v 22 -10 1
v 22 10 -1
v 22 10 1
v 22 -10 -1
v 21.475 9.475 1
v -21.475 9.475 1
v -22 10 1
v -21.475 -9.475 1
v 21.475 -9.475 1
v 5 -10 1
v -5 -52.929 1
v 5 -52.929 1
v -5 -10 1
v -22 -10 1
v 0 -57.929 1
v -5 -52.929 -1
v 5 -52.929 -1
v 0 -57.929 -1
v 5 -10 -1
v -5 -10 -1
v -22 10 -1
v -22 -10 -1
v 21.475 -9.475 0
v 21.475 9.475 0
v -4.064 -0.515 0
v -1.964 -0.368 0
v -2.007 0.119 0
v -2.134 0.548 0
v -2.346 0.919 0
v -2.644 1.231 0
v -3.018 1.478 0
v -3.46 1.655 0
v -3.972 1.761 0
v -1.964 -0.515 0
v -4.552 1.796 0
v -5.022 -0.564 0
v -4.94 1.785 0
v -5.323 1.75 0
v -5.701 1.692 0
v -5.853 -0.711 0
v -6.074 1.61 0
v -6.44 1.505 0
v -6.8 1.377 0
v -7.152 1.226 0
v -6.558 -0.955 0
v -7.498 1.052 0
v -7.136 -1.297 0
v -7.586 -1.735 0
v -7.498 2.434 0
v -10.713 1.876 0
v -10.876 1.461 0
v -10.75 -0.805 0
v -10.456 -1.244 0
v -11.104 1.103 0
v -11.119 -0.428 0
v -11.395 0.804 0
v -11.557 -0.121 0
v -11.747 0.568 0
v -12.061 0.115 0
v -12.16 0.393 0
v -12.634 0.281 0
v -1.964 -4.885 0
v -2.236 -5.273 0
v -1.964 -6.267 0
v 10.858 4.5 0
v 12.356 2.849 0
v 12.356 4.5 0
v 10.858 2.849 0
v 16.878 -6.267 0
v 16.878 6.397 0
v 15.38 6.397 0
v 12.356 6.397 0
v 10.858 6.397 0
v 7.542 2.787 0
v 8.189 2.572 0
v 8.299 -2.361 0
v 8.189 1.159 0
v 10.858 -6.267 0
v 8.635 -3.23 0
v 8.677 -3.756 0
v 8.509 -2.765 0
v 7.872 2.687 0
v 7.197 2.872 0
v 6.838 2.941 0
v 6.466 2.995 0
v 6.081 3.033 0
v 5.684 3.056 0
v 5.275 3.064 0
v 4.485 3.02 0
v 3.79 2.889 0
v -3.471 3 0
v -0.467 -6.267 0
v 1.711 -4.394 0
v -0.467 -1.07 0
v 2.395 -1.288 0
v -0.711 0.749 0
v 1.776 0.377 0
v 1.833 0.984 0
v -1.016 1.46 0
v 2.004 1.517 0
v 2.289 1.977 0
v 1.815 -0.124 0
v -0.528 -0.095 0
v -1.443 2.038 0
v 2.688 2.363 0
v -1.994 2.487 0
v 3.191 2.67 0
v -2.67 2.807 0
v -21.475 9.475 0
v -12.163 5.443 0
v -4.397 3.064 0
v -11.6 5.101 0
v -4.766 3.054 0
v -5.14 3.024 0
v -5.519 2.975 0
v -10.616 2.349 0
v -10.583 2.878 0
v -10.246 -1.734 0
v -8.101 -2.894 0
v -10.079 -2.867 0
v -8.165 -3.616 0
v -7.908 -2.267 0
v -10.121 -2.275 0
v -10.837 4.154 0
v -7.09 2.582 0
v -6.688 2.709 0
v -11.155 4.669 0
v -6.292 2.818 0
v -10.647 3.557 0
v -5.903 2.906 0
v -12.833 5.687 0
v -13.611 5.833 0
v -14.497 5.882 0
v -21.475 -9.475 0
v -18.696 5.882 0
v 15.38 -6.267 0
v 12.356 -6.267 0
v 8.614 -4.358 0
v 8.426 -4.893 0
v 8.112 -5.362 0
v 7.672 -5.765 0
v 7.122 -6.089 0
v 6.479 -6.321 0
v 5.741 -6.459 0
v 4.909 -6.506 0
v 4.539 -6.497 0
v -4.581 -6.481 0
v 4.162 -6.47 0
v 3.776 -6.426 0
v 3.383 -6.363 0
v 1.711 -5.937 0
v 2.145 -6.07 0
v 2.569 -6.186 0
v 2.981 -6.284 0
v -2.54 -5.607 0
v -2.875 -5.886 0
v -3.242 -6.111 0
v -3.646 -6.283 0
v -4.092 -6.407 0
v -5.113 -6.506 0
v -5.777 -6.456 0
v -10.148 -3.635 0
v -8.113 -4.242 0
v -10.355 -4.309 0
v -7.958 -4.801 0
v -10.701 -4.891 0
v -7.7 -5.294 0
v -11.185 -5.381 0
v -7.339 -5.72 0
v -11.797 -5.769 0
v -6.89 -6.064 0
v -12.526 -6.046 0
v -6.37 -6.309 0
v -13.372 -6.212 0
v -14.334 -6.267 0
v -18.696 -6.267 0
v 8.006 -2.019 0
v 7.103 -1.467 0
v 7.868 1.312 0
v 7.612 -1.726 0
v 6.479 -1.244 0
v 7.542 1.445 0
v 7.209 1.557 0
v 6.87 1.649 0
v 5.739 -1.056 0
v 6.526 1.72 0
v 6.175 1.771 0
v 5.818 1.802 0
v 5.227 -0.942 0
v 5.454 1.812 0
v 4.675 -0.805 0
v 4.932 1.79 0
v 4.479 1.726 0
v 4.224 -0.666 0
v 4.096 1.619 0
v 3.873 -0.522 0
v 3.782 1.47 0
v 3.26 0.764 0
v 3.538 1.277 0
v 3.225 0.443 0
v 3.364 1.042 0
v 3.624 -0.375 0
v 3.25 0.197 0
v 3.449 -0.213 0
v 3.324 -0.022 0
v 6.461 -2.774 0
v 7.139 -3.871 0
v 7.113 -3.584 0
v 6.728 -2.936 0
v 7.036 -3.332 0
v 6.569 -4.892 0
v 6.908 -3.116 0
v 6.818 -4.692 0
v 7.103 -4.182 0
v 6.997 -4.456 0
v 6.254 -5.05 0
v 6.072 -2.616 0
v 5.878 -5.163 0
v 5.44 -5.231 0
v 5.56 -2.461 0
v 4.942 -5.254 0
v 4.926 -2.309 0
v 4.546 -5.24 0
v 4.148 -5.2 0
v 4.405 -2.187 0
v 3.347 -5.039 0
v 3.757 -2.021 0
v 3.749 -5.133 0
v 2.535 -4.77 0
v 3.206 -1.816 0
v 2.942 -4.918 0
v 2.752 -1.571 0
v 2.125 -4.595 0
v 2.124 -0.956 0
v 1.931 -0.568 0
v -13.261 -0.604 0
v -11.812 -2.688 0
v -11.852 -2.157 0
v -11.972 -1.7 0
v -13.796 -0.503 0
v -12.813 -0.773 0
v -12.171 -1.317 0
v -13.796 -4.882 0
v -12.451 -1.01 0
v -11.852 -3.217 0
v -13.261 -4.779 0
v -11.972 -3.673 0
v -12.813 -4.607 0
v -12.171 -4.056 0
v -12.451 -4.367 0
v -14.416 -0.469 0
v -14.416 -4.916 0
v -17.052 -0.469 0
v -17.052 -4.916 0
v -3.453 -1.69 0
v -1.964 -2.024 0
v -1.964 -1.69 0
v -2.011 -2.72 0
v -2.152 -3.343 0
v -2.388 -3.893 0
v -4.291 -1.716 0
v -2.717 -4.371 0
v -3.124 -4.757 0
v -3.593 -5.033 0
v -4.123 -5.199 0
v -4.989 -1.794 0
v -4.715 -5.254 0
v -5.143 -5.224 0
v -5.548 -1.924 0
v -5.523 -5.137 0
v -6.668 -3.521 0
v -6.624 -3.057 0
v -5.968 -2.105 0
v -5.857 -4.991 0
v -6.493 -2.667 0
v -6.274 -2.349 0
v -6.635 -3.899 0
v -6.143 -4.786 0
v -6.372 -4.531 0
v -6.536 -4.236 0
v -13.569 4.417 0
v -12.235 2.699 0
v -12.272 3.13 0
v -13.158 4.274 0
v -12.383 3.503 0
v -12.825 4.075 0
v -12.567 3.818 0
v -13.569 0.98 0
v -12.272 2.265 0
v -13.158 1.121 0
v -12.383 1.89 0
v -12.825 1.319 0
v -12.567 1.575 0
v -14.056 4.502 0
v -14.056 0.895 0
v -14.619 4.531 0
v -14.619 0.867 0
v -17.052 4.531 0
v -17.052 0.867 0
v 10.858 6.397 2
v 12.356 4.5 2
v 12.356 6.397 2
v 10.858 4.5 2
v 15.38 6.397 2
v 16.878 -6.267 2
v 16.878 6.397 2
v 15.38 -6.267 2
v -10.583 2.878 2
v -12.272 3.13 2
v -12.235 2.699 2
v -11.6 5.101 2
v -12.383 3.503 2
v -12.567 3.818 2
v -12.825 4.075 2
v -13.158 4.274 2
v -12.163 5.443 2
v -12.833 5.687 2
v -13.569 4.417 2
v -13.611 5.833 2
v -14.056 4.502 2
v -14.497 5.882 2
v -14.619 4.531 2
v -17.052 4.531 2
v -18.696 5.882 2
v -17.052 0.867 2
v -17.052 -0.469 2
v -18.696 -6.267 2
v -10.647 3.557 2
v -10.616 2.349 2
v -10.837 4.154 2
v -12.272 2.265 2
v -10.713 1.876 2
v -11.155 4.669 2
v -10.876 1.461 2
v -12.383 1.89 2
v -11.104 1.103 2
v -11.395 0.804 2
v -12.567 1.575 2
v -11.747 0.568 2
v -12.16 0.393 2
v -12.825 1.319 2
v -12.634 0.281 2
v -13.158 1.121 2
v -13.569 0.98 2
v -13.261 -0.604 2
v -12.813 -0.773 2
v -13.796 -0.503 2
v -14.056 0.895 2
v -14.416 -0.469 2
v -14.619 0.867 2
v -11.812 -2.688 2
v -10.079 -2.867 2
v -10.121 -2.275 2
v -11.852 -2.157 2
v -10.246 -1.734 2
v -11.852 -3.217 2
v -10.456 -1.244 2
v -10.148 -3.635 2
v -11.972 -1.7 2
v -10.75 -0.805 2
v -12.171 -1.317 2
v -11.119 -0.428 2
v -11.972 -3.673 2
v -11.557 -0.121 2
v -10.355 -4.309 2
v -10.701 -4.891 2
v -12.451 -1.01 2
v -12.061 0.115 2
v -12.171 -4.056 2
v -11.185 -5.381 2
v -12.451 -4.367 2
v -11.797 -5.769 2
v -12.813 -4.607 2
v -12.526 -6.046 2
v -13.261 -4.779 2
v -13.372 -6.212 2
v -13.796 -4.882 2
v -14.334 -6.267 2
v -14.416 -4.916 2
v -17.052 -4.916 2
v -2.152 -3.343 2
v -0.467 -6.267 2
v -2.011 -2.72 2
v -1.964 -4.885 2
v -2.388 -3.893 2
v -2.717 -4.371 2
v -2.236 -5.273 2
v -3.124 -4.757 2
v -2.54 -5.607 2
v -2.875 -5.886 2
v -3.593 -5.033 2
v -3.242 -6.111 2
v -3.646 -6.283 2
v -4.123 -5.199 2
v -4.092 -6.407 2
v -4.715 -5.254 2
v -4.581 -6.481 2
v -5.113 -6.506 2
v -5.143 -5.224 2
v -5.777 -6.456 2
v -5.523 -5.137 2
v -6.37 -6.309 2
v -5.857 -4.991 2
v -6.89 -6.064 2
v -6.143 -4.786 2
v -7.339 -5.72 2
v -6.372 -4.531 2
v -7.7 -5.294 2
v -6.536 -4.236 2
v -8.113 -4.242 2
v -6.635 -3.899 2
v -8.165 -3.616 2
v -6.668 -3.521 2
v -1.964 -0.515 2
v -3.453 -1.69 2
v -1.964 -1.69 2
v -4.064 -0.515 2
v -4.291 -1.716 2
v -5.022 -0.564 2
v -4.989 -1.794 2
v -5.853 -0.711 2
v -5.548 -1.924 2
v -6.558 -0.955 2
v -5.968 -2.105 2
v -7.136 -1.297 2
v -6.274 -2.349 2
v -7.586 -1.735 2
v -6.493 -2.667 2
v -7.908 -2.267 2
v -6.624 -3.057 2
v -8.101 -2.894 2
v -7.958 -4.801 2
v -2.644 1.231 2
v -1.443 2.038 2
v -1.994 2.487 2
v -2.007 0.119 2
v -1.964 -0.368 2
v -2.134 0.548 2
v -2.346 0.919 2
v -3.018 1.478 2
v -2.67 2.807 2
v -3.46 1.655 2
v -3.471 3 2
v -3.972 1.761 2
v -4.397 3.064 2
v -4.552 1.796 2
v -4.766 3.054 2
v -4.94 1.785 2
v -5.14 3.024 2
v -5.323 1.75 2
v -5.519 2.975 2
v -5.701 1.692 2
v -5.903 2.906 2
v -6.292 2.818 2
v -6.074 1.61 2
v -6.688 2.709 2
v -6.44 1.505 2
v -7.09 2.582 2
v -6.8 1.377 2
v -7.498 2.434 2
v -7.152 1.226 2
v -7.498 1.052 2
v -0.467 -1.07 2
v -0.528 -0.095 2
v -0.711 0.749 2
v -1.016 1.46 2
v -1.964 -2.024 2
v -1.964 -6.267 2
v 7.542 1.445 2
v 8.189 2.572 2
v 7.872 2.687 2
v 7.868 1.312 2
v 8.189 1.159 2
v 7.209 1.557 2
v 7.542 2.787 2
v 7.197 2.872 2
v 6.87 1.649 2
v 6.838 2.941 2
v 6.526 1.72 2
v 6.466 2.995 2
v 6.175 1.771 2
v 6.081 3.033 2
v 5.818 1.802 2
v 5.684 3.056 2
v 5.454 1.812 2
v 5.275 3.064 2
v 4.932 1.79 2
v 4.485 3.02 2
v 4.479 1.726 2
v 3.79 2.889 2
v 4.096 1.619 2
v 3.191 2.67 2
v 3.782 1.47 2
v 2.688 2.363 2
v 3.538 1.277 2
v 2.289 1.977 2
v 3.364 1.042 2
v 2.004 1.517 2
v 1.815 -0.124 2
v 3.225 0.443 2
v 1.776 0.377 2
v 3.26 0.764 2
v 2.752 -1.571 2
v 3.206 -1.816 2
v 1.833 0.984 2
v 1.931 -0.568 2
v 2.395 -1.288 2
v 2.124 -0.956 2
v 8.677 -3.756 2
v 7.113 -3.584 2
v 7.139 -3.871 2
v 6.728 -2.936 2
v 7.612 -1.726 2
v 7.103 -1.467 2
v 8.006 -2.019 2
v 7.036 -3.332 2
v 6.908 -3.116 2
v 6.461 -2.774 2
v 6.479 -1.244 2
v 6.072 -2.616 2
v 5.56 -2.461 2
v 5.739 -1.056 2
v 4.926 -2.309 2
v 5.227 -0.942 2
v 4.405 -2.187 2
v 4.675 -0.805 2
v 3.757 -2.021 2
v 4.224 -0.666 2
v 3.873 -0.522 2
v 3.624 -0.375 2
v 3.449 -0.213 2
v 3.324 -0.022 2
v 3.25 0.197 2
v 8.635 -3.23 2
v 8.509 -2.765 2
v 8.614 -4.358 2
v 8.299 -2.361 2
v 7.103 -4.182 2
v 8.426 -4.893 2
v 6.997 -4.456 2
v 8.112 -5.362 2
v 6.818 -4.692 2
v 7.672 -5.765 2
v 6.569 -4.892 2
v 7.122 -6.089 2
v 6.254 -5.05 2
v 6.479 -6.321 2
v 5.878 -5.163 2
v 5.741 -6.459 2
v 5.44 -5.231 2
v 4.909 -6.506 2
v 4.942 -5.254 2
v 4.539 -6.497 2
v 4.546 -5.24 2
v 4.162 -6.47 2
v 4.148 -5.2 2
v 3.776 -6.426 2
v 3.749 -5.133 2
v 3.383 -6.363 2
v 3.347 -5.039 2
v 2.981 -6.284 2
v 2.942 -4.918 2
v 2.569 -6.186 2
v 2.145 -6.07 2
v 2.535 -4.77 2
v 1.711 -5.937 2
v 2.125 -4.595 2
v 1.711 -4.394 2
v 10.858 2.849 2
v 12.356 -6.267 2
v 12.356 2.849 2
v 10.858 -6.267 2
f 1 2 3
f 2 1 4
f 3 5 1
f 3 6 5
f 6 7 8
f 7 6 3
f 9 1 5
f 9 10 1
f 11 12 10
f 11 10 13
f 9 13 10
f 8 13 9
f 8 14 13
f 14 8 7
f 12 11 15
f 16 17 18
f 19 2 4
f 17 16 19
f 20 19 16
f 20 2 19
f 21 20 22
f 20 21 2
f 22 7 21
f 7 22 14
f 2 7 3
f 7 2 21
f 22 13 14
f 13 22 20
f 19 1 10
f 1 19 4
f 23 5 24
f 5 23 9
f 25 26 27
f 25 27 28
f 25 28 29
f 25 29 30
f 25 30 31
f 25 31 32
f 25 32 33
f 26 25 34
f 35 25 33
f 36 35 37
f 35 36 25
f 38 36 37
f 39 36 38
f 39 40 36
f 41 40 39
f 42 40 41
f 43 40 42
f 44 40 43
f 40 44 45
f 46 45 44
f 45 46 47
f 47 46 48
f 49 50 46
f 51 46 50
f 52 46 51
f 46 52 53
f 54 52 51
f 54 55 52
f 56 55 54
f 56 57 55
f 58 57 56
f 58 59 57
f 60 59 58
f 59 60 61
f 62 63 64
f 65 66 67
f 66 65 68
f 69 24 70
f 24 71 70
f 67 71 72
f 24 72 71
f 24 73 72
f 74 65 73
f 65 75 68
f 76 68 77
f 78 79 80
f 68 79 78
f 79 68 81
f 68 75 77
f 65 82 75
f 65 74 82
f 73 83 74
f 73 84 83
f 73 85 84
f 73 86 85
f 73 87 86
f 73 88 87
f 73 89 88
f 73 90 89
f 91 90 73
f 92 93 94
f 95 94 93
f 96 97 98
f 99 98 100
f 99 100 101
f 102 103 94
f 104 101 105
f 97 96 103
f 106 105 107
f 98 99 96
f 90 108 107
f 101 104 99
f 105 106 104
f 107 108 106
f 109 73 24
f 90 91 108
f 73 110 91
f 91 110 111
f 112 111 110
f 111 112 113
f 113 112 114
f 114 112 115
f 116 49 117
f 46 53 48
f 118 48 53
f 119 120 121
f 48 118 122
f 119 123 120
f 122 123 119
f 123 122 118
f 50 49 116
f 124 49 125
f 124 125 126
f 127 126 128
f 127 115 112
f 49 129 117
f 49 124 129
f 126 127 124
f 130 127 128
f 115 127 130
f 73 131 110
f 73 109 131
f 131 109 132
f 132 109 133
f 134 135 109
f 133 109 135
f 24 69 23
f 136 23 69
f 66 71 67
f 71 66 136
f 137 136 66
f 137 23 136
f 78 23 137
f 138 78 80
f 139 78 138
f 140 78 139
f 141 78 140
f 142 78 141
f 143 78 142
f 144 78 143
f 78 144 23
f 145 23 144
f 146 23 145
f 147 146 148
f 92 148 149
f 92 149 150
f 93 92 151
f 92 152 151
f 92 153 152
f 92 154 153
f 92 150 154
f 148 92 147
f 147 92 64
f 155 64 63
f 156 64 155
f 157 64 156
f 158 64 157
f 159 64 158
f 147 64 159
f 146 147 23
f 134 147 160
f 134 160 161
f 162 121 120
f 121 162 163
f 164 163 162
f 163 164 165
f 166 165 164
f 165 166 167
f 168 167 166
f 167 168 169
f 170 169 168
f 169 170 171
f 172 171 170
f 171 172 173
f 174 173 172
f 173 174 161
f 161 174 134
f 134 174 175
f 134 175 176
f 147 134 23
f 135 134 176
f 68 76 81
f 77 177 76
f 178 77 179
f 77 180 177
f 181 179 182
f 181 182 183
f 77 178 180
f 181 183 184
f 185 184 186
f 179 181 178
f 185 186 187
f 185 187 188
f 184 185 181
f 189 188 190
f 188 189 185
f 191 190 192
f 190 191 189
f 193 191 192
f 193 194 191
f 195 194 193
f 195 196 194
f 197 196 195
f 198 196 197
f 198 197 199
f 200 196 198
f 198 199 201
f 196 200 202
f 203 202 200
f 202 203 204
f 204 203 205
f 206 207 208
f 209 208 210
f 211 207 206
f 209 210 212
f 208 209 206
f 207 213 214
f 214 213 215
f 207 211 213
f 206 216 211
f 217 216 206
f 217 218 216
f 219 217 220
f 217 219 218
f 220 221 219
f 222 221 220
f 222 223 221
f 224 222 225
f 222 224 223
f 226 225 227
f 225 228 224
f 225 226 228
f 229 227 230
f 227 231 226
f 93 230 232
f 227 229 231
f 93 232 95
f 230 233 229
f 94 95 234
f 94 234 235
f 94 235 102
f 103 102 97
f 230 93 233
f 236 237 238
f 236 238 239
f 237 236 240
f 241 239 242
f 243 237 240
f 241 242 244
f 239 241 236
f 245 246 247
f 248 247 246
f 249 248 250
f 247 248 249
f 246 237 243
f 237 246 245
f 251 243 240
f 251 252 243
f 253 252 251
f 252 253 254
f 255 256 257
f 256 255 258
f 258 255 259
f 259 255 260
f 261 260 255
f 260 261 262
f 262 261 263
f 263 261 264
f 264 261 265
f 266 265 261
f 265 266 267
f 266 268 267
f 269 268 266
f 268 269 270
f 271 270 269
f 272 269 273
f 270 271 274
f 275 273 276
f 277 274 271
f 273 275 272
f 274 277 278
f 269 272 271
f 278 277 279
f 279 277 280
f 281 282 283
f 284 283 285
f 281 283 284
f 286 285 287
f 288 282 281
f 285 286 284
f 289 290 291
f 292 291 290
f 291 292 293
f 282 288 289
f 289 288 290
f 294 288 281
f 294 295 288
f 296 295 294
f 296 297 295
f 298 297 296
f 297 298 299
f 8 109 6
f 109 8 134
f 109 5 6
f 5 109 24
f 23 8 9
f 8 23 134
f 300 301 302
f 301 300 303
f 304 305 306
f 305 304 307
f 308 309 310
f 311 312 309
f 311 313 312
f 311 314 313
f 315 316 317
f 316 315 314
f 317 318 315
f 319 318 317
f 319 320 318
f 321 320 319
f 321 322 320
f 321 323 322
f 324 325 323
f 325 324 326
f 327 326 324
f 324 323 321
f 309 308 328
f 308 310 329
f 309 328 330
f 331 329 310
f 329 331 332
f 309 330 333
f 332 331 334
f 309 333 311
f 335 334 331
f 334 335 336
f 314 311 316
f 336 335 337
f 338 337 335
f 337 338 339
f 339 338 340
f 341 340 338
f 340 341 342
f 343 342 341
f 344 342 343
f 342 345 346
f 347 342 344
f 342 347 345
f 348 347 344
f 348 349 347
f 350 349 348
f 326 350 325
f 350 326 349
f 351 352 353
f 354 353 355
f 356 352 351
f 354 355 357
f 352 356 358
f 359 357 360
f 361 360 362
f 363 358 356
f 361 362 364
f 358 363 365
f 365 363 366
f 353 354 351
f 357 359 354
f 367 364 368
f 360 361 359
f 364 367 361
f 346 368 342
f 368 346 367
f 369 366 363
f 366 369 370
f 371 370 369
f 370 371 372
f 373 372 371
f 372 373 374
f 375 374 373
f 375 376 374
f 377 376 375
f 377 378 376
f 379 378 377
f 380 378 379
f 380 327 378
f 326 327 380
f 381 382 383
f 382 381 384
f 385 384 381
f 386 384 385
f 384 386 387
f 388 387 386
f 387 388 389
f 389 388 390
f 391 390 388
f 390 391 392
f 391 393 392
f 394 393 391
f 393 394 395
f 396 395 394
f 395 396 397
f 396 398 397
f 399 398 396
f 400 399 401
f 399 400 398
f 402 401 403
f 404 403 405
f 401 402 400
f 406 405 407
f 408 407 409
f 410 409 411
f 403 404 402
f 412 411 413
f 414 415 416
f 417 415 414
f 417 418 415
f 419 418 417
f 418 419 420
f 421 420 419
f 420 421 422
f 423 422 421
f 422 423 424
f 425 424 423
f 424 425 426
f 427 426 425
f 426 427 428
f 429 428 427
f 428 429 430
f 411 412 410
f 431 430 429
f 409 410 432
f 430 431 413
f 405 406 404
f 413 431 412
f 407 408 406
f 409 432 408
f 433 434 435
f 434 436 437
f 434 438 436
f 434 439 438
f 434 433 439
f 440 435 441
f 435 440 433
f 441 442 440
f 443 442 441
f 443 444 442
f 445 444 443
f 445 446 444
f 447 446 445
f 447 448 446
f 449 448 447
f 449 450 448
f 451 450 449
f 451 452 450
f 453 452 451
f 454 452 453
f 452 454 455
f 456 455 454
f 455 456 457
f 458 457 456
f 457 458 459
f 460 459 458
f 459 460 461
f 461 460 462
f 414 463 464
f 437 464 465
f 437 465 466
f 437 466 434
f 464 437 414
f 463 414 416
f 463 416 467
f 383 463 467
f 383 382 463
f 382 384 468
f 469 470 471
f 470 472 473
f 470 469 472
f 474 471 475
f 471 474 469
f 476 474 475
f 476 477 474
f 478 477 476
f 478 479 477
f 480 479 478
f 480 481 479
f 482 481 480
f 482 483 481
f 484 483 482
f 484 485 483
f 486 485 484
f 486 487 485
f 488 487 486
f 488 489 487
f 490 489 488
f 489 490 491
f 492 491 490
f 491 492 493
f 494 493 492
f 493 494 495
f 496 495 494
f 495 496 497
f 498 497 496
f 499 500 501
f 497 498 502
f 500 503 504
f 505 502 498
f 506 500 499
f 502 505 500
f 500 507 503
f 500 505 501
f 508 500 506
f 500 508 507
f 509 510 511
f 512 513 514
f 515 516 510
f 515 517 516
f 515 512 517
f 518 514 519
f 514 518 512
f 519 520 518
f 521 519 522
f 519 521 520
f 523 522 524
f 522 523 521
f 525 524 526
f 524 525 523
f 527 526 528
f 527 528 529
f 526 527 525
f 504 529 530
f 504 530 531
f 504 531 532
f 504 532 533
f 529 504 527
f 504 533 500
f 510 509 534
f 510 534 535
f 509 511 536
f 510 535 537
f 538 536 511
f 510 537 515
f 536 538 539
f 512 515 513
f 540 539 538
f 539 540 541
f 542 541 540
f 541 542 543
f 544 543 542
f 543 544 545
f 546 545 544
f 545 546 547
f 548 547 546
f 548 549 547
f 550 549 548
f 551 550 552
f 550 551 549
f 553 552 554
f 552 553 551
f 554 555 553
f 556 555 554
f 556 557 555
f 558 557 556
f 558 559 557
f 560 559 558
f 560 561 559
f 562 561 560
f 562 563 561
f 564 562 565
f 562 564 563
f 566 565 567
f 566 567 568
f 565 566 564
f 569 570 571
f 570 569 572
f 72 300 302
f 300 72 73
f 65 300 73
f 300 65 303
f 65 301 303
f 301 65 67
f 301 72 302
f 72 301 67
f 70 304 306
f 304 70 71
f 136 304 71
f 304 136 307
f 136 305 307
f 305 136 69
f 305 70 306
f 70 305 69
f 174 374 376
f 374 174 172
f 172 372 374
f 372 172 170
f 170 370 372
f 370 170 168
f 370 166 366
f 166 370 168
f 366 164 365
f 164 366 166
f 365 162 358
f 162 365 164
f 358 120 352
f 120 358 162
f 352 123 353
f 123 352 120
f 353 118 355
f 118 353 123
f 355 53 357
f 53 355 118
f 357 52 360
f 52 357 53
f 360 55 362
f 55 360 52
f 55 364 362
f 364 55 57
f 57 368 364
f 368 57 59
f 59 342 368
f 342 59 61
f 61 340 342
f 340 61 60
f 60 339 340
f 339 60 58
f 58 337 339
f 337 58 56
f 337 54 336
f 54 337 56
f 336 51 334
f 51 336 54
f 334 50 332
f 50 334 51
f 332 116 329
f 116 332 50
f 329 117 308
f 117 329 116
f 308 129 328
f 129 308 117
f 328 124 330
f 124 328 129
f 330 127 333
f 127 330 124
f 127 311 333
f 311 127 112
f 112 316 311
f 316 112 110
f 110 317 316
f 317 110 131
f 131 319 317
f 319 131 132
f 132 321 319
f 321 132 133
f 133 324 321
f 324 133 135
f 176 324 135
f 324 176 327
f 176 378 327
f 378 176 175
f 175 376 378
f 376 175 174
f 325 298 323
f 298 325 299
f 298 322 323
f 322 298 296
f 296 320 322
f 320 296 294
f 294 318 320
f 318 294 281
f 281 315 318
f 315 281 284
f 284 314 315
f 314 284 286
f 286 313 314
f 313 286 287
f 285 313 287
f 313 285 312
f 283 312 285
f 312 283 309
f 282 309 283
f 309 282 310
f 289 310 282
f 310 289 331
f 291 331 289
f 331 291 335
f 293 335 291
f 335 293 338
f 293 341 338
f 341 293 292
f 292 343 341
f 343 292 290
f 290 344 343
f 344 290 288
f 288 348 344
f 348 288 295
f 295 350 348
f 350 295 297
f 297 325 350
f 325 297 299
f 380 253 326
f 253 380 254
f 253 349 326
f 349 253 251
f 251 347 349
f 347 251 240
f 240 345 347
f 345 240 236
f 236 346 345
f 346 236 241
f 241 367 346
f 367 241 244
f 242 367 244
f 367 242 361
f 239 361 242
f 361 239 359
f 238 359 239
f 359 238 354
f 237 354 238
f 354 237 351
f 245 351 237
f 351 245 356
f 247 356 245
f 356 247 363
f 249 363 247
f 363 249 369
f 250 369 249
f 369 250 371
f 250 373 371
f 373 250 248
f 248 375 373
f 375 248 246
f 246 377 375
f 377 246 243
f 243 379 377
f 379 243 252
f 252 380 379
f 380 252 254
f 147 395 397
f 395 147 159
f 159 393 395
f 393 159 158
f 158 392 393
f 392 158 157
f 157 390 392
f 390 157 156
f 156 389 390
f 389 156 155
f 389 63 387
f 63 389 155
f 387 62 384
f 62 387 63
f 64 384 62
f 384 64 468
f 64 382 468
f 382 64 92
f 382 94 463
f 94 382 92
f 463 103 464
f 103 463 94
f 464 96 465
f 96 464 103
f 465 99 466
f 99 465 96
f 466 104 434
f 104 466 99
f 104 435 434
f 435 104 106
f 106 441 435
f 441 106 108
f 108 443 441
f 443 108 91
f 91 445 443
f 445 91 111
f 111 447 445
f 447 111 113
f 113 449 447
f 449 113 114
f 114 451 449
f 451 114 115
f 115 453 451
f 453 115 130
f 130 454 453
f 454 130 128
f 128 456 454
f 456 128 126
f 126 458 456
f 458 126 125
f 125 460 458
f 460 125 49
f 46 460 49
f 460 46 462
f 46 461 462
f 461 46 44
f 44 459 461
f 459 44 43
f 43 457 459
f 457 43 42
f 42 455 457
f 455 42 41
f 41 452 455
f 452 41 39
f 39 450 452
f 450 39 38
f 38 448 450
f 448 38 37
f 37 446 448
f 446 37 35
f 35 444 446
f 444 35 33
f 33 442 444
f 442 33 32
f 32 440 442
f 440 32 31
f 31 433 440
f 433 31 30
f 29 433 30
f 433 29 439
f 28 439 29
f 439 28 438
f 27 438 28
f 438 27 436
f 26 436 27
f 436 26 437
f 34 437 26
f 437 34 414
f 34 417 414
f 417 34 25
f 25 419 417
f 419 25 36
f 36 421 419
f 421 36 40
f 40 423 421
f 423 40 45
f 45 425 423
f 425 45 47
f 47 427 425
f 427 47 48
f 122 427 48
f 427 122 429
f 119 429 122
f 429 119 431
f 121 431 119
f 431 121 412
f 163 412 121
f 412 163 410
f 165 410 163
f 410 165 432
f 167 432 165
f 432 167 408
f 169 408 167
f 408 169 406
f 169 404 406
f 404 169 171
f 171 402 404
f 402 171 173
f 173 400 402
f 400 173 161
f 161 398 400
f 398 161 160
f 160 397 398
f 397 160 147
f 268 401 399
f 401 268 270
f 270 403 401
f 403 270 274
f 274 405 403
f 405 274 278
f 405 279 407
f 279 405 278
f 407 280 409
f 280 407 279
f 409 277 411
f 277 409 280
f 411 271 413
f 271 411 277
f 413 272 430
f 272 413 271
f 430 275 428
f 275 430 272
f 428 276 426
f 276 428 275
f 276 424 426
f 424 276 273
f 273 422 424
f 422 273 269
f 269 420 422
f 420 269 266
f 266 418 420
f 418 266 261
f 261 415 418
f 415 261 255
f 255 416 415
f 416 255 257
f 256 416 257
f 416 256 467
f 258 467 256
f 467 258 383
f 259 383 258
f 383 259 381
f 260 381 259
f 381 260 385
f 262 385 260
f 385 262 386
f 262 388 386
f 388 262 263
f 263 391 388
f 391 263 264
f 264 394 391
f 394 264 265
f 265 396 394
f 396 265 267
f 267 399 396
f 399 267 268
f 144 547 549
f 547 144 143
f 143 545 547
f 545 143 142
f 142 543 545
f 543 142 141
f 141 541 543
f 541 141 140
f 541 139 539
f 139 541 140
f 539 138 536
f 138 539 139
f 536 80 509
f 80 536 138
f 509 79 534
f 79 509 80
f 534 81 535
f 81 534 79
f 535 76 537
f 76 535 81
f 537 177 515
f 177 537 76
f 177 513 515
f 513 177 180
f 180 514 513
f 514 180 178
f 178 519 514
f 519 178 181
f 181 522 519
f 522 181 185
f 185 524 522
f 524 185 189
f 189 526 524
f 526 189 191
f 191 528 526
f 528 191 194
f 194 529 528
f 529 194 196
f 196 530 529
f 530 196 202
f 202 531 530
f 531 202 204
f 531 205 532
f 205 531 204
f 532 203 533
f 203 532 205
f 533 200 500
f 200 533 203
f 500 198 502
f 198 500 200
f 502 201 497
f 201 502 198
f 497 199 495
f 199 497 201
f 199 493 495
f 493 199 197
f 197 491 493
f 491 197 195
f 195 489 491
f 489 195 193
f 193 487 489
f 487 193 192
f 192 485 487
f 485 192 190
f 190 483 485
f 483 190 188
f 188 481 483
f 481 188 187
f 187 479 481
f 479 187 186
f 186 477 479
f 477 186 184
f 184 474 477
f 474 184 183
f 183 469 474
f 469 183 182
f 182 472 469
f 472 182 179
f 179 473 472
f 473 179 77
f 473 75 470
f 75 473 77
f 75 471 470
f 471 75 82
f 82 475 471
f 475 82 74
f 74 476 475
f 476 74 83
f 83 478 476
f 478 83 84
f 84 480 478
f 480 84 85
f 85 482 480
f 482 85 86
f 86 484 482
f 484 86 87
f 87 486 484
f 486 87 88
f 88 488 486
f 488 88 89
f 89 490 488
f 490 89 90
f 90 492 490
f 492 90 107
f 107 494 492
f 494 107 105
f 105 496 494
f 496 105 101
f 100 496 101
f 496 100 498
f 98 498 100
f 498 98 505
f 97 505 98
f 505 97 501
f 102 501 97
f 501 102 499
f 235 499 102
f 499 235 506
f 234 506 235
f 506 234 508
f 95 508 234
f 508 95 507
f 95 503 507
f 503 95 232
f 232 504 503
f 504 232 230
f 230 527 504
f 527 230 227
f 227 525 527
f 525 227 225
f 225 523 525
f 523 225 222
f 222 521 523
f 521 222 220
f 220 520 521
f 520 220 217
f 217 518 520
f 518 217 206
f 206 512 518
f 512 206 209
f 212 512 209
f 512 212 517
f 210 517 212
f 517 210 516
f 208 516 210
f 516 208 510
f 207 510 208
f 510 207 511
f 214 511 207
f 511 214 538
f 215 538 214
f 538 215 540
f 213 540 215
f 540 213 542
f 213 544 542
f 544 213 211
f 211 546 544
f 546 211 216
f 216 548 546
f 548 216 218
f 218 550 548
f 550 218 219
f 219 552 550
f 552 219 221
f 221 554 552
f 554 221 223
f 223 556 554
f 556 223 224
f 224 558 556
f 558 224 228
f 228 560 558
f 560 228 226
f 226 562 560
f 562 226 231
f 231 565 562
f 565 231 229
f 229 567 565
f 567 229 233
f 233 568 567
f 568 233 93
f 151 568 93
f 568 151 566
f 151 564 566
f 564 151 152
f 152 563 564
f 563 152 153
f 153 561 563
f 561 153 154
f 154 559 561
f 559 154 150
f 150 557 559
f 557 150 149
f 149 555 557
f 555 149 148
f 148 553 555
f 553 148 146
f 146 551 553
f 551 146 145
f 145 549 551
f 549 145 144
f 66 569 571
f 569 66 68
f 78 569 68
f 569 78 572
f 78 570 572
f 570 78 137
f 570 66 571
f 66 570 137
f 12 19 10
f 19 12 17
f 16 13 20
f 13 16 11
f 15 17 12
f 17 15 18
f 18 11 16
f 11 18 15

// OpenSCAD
lettering = "Basil";
// font
style = "Pacifico"; //[Abril Fatface,Aclonica,Acme,Advent Pro,Akronim,Aladin,Alegreya,Alegreya Sans,Alegreya SC,Alex Brush,Alfa Slab One,Alice,Amaranth,Architects Daughter,Archivo Black,Archivo Narrow,Arimo,Arvo,Asap,Astloch,Asul,Averia Libre,Averia Serif Libre,Bangers,Basic,Belgrano,Berkshire Swash,Bigshot One,Bilbo Swash Caps,Black Ops One,Bonbon,Bowlby One SC,Brawler,Bubblegum Sans,Butterfly Kids,Cabin Condensed,Caesar Dressing,Cagliostro,Calligraffitti,Capriola,Carter One,Changa One,Chango,Chelsea Market,Cherry Cream Soda,Chewy,Chicle,Chivo,Clicker Script,Coming Soon,Concert One,Condiment,Cookie,Courgette,Covered By Your Grace,Crimson Text,Dancing Script,DejaVu Sans,DejaVu Serif,Dhurjati,Doppio One,Dosis,Droid Sans,Eagle Lake,Electrolize,Emilys Candy,Encode Sans,Encode Sans Compressed,Euphoria Script,Exo,Exo 2,Faster One,Federo,Finger Paint,Fjord One,Fontdiner Swanky,Freckle Face,Fruktur,Gabriela,Geo,Germania One,Give You Glory,Gloria Hallelujah,Goudy Bookletter 1911,Graduate,Grand Hotel,Great Vibes,Griffy,Hanalei Fill,Happy Monkey,Henny Penny,Hind,IM Fell English SC,Indie Flower,Irish Grover,Italianno,Jacques Francois Shadow,Jolly Lodger,Josefin Slab,Joti One,Judson,Just Another Hand,Kalam,Kameron,Karma,Kavoon,Knewave,Kranky,Kristi,Laila,Lakki Reddy,Lancelot,Lato,Leckerli One,Ledger,Lekton,Lemon One,Liberation Sans,Libre Caslon Text,Life Savers,Lilita One,Lily Script One,Limelight,Lobster,Lobster Two,Londrina Outline,Londrina Shadow,Londrina Solid,Lora,Love Ya Like A Sister,Loved by the King,Lovers Quarrel,Luckiest Guy,Lusitana,Macondo,Macondo Swash Caps,Mako,Marck Script,Margarine,Marko One,Maven Pro,McLaren,MedievalSharp,Merienda One,Merriweather,Mervale Script,Metal Mania,Metrophobic,Milonga,Miltonian Tattoo,Miss Fajardose,Molle,Montez,Montserrat,Mr De Haviland,Mystery Quest,Neucha,New Rocker,Niconne,Nosifer,Nothing You Could Do,Noto Sans Oriya,Noto Serif,Nova Square,Nunito,Old Standard TT,Oleo Script,Oleo Script Swash Caps,Orbitron,Oregano,Orienta,Original Surfer,Oswald,Over the Rainbow,Overlock,Oxygen,Pacifico,Paprika,Parisienne,Patrick Hand SC,Paytone One,Peralta,Permanent Marker,Piedra,Pirata One,Play,Playball,Poetsen One,Poppins,Press Start 2P,Princess Sofia,PT Mono,Qwigley,Racing Sans One,Raleway,Rancho,Ranga,Ribeye,Roboto,Roboto Condensed,Roboto Slab,Rochester,Rock Salt,Rubik One,Sail,Salsa,Sansita One,Sarina,Satisfy,Schoolbell,Seaweed Script,Sevillana,Shadows Into Light,Shadows Into Light Two,Share,Six Caps,Skranji,Source Sans Pro,Spicy Rice,Stardos Stencil,Stoke,Syncopate,Teko,Terminal Dosis,The Girl Next Door,Tillana,Timmana,Titillium Web,Ubuntu,Ultra,Underdog,UnifrakturCook,UnifrakturMaguntia,Vampiro One,Vidaloka,Viga,Voces,Volkhov,Vollkorn,Voltaire,Waiting for the Sunrise,Wallpoet,Wellfleet,Wendy One,Yellowtail,Yesteryear,Zeyada]
labelStyle = "Indent"; //[Cutout,OnTop,Indent]
oneOrTwoSticks = "One"; //[One, Two]

textSpacing = 1; //[1:10]
textSize = 12; //[1:30]
textNudgeX = -10; //[-100:100]
textNudgeY = -2; //[-100:100]
textHeight = 2; //[1:10]



labelWidth = 44; //[1:200]
labelHeight = 20; //[1:50]
labelDepth = 2; //[1:10]
//only used for indent style; no sense to make this more than Label Depth; value =
indentDepth = 1;
// good idea to make this a multiple of nozzle size
indentEdgeWidth = 1.05;
stickWidth = 10; //[1:50]
stickLength = 50; //[1:200]


module label1() {
    difference() {
        cube ([labelWidth, labelHeight, labelDepth], center=true);
        translate([textNudgeX/10,textNudgeY/10,-(labelDepth+1)/2])
        linear_extrude(height=textHeight)
        text (lettering,  size=textSize, font = style, halign = "center", valign = "center", spacing = textSpacing);
    };
}

module label2() {
        cube ([labelWidth, labelHeight, labelDepth], center=true);
        translate([textNudgeX/10,textNudgeY/10,(labelDepth)/2])
        linear_extrude(height=textHeight)
        text (lettering,  size=textSize, font = style, halign = "center", valign = "center", spacing = textSpacing);
}

module label3() {
    difference() {
        cube ([labelWidth, labelHeight, labelDepth], center=true);
        translate([0,0,2*labelDepth/2+labelDepth/2-indentDepth])
        cube ([labelWidth-indentEdgeWidth, labelHeight-indentEdgeWidth, 2*labelDepth], center=true);
    }
        translate([textNudgeX/10,textNudgeY/10,(labelDepth)/2-indentDepth])
        linear_extrude(height=textHeight)
        text (lettering,  size=textSize, font = style, halign = "center", valign = "center", spacing = textSpacing);
}

module stick() {
    translate([0,-stickLength/2-labelHeight/2,0])
    difference() {
        cube([stickWidth,stickLength,labelDepth],center=true);
        translate([stickWidth/2,-stickLength/2,0])
        rotate([0,0,45])
        cube([stickWidth,stickWidth,labelDepth+1],center=true);
        translate([-stickWidth/2,-stickLength/2,0])
        rotate([0,0,45])
        cube([stickWidth,stickWidth,labelDepth+1],center=true);
    }
}

if (labelStyle == "Cutout") {
    label1();
} else if (labelStyle == "OnTop") {
    label2();
} else {
    label3();
}
    
if (oneOrTwoSticks == "One") {
    stick();
} else {
    translate([labelWidth/2-stickWidth/2,0,0])
    stick();
    translate([-(labelWidth/2-stickWidth/2),0,0])
    stick();
}
